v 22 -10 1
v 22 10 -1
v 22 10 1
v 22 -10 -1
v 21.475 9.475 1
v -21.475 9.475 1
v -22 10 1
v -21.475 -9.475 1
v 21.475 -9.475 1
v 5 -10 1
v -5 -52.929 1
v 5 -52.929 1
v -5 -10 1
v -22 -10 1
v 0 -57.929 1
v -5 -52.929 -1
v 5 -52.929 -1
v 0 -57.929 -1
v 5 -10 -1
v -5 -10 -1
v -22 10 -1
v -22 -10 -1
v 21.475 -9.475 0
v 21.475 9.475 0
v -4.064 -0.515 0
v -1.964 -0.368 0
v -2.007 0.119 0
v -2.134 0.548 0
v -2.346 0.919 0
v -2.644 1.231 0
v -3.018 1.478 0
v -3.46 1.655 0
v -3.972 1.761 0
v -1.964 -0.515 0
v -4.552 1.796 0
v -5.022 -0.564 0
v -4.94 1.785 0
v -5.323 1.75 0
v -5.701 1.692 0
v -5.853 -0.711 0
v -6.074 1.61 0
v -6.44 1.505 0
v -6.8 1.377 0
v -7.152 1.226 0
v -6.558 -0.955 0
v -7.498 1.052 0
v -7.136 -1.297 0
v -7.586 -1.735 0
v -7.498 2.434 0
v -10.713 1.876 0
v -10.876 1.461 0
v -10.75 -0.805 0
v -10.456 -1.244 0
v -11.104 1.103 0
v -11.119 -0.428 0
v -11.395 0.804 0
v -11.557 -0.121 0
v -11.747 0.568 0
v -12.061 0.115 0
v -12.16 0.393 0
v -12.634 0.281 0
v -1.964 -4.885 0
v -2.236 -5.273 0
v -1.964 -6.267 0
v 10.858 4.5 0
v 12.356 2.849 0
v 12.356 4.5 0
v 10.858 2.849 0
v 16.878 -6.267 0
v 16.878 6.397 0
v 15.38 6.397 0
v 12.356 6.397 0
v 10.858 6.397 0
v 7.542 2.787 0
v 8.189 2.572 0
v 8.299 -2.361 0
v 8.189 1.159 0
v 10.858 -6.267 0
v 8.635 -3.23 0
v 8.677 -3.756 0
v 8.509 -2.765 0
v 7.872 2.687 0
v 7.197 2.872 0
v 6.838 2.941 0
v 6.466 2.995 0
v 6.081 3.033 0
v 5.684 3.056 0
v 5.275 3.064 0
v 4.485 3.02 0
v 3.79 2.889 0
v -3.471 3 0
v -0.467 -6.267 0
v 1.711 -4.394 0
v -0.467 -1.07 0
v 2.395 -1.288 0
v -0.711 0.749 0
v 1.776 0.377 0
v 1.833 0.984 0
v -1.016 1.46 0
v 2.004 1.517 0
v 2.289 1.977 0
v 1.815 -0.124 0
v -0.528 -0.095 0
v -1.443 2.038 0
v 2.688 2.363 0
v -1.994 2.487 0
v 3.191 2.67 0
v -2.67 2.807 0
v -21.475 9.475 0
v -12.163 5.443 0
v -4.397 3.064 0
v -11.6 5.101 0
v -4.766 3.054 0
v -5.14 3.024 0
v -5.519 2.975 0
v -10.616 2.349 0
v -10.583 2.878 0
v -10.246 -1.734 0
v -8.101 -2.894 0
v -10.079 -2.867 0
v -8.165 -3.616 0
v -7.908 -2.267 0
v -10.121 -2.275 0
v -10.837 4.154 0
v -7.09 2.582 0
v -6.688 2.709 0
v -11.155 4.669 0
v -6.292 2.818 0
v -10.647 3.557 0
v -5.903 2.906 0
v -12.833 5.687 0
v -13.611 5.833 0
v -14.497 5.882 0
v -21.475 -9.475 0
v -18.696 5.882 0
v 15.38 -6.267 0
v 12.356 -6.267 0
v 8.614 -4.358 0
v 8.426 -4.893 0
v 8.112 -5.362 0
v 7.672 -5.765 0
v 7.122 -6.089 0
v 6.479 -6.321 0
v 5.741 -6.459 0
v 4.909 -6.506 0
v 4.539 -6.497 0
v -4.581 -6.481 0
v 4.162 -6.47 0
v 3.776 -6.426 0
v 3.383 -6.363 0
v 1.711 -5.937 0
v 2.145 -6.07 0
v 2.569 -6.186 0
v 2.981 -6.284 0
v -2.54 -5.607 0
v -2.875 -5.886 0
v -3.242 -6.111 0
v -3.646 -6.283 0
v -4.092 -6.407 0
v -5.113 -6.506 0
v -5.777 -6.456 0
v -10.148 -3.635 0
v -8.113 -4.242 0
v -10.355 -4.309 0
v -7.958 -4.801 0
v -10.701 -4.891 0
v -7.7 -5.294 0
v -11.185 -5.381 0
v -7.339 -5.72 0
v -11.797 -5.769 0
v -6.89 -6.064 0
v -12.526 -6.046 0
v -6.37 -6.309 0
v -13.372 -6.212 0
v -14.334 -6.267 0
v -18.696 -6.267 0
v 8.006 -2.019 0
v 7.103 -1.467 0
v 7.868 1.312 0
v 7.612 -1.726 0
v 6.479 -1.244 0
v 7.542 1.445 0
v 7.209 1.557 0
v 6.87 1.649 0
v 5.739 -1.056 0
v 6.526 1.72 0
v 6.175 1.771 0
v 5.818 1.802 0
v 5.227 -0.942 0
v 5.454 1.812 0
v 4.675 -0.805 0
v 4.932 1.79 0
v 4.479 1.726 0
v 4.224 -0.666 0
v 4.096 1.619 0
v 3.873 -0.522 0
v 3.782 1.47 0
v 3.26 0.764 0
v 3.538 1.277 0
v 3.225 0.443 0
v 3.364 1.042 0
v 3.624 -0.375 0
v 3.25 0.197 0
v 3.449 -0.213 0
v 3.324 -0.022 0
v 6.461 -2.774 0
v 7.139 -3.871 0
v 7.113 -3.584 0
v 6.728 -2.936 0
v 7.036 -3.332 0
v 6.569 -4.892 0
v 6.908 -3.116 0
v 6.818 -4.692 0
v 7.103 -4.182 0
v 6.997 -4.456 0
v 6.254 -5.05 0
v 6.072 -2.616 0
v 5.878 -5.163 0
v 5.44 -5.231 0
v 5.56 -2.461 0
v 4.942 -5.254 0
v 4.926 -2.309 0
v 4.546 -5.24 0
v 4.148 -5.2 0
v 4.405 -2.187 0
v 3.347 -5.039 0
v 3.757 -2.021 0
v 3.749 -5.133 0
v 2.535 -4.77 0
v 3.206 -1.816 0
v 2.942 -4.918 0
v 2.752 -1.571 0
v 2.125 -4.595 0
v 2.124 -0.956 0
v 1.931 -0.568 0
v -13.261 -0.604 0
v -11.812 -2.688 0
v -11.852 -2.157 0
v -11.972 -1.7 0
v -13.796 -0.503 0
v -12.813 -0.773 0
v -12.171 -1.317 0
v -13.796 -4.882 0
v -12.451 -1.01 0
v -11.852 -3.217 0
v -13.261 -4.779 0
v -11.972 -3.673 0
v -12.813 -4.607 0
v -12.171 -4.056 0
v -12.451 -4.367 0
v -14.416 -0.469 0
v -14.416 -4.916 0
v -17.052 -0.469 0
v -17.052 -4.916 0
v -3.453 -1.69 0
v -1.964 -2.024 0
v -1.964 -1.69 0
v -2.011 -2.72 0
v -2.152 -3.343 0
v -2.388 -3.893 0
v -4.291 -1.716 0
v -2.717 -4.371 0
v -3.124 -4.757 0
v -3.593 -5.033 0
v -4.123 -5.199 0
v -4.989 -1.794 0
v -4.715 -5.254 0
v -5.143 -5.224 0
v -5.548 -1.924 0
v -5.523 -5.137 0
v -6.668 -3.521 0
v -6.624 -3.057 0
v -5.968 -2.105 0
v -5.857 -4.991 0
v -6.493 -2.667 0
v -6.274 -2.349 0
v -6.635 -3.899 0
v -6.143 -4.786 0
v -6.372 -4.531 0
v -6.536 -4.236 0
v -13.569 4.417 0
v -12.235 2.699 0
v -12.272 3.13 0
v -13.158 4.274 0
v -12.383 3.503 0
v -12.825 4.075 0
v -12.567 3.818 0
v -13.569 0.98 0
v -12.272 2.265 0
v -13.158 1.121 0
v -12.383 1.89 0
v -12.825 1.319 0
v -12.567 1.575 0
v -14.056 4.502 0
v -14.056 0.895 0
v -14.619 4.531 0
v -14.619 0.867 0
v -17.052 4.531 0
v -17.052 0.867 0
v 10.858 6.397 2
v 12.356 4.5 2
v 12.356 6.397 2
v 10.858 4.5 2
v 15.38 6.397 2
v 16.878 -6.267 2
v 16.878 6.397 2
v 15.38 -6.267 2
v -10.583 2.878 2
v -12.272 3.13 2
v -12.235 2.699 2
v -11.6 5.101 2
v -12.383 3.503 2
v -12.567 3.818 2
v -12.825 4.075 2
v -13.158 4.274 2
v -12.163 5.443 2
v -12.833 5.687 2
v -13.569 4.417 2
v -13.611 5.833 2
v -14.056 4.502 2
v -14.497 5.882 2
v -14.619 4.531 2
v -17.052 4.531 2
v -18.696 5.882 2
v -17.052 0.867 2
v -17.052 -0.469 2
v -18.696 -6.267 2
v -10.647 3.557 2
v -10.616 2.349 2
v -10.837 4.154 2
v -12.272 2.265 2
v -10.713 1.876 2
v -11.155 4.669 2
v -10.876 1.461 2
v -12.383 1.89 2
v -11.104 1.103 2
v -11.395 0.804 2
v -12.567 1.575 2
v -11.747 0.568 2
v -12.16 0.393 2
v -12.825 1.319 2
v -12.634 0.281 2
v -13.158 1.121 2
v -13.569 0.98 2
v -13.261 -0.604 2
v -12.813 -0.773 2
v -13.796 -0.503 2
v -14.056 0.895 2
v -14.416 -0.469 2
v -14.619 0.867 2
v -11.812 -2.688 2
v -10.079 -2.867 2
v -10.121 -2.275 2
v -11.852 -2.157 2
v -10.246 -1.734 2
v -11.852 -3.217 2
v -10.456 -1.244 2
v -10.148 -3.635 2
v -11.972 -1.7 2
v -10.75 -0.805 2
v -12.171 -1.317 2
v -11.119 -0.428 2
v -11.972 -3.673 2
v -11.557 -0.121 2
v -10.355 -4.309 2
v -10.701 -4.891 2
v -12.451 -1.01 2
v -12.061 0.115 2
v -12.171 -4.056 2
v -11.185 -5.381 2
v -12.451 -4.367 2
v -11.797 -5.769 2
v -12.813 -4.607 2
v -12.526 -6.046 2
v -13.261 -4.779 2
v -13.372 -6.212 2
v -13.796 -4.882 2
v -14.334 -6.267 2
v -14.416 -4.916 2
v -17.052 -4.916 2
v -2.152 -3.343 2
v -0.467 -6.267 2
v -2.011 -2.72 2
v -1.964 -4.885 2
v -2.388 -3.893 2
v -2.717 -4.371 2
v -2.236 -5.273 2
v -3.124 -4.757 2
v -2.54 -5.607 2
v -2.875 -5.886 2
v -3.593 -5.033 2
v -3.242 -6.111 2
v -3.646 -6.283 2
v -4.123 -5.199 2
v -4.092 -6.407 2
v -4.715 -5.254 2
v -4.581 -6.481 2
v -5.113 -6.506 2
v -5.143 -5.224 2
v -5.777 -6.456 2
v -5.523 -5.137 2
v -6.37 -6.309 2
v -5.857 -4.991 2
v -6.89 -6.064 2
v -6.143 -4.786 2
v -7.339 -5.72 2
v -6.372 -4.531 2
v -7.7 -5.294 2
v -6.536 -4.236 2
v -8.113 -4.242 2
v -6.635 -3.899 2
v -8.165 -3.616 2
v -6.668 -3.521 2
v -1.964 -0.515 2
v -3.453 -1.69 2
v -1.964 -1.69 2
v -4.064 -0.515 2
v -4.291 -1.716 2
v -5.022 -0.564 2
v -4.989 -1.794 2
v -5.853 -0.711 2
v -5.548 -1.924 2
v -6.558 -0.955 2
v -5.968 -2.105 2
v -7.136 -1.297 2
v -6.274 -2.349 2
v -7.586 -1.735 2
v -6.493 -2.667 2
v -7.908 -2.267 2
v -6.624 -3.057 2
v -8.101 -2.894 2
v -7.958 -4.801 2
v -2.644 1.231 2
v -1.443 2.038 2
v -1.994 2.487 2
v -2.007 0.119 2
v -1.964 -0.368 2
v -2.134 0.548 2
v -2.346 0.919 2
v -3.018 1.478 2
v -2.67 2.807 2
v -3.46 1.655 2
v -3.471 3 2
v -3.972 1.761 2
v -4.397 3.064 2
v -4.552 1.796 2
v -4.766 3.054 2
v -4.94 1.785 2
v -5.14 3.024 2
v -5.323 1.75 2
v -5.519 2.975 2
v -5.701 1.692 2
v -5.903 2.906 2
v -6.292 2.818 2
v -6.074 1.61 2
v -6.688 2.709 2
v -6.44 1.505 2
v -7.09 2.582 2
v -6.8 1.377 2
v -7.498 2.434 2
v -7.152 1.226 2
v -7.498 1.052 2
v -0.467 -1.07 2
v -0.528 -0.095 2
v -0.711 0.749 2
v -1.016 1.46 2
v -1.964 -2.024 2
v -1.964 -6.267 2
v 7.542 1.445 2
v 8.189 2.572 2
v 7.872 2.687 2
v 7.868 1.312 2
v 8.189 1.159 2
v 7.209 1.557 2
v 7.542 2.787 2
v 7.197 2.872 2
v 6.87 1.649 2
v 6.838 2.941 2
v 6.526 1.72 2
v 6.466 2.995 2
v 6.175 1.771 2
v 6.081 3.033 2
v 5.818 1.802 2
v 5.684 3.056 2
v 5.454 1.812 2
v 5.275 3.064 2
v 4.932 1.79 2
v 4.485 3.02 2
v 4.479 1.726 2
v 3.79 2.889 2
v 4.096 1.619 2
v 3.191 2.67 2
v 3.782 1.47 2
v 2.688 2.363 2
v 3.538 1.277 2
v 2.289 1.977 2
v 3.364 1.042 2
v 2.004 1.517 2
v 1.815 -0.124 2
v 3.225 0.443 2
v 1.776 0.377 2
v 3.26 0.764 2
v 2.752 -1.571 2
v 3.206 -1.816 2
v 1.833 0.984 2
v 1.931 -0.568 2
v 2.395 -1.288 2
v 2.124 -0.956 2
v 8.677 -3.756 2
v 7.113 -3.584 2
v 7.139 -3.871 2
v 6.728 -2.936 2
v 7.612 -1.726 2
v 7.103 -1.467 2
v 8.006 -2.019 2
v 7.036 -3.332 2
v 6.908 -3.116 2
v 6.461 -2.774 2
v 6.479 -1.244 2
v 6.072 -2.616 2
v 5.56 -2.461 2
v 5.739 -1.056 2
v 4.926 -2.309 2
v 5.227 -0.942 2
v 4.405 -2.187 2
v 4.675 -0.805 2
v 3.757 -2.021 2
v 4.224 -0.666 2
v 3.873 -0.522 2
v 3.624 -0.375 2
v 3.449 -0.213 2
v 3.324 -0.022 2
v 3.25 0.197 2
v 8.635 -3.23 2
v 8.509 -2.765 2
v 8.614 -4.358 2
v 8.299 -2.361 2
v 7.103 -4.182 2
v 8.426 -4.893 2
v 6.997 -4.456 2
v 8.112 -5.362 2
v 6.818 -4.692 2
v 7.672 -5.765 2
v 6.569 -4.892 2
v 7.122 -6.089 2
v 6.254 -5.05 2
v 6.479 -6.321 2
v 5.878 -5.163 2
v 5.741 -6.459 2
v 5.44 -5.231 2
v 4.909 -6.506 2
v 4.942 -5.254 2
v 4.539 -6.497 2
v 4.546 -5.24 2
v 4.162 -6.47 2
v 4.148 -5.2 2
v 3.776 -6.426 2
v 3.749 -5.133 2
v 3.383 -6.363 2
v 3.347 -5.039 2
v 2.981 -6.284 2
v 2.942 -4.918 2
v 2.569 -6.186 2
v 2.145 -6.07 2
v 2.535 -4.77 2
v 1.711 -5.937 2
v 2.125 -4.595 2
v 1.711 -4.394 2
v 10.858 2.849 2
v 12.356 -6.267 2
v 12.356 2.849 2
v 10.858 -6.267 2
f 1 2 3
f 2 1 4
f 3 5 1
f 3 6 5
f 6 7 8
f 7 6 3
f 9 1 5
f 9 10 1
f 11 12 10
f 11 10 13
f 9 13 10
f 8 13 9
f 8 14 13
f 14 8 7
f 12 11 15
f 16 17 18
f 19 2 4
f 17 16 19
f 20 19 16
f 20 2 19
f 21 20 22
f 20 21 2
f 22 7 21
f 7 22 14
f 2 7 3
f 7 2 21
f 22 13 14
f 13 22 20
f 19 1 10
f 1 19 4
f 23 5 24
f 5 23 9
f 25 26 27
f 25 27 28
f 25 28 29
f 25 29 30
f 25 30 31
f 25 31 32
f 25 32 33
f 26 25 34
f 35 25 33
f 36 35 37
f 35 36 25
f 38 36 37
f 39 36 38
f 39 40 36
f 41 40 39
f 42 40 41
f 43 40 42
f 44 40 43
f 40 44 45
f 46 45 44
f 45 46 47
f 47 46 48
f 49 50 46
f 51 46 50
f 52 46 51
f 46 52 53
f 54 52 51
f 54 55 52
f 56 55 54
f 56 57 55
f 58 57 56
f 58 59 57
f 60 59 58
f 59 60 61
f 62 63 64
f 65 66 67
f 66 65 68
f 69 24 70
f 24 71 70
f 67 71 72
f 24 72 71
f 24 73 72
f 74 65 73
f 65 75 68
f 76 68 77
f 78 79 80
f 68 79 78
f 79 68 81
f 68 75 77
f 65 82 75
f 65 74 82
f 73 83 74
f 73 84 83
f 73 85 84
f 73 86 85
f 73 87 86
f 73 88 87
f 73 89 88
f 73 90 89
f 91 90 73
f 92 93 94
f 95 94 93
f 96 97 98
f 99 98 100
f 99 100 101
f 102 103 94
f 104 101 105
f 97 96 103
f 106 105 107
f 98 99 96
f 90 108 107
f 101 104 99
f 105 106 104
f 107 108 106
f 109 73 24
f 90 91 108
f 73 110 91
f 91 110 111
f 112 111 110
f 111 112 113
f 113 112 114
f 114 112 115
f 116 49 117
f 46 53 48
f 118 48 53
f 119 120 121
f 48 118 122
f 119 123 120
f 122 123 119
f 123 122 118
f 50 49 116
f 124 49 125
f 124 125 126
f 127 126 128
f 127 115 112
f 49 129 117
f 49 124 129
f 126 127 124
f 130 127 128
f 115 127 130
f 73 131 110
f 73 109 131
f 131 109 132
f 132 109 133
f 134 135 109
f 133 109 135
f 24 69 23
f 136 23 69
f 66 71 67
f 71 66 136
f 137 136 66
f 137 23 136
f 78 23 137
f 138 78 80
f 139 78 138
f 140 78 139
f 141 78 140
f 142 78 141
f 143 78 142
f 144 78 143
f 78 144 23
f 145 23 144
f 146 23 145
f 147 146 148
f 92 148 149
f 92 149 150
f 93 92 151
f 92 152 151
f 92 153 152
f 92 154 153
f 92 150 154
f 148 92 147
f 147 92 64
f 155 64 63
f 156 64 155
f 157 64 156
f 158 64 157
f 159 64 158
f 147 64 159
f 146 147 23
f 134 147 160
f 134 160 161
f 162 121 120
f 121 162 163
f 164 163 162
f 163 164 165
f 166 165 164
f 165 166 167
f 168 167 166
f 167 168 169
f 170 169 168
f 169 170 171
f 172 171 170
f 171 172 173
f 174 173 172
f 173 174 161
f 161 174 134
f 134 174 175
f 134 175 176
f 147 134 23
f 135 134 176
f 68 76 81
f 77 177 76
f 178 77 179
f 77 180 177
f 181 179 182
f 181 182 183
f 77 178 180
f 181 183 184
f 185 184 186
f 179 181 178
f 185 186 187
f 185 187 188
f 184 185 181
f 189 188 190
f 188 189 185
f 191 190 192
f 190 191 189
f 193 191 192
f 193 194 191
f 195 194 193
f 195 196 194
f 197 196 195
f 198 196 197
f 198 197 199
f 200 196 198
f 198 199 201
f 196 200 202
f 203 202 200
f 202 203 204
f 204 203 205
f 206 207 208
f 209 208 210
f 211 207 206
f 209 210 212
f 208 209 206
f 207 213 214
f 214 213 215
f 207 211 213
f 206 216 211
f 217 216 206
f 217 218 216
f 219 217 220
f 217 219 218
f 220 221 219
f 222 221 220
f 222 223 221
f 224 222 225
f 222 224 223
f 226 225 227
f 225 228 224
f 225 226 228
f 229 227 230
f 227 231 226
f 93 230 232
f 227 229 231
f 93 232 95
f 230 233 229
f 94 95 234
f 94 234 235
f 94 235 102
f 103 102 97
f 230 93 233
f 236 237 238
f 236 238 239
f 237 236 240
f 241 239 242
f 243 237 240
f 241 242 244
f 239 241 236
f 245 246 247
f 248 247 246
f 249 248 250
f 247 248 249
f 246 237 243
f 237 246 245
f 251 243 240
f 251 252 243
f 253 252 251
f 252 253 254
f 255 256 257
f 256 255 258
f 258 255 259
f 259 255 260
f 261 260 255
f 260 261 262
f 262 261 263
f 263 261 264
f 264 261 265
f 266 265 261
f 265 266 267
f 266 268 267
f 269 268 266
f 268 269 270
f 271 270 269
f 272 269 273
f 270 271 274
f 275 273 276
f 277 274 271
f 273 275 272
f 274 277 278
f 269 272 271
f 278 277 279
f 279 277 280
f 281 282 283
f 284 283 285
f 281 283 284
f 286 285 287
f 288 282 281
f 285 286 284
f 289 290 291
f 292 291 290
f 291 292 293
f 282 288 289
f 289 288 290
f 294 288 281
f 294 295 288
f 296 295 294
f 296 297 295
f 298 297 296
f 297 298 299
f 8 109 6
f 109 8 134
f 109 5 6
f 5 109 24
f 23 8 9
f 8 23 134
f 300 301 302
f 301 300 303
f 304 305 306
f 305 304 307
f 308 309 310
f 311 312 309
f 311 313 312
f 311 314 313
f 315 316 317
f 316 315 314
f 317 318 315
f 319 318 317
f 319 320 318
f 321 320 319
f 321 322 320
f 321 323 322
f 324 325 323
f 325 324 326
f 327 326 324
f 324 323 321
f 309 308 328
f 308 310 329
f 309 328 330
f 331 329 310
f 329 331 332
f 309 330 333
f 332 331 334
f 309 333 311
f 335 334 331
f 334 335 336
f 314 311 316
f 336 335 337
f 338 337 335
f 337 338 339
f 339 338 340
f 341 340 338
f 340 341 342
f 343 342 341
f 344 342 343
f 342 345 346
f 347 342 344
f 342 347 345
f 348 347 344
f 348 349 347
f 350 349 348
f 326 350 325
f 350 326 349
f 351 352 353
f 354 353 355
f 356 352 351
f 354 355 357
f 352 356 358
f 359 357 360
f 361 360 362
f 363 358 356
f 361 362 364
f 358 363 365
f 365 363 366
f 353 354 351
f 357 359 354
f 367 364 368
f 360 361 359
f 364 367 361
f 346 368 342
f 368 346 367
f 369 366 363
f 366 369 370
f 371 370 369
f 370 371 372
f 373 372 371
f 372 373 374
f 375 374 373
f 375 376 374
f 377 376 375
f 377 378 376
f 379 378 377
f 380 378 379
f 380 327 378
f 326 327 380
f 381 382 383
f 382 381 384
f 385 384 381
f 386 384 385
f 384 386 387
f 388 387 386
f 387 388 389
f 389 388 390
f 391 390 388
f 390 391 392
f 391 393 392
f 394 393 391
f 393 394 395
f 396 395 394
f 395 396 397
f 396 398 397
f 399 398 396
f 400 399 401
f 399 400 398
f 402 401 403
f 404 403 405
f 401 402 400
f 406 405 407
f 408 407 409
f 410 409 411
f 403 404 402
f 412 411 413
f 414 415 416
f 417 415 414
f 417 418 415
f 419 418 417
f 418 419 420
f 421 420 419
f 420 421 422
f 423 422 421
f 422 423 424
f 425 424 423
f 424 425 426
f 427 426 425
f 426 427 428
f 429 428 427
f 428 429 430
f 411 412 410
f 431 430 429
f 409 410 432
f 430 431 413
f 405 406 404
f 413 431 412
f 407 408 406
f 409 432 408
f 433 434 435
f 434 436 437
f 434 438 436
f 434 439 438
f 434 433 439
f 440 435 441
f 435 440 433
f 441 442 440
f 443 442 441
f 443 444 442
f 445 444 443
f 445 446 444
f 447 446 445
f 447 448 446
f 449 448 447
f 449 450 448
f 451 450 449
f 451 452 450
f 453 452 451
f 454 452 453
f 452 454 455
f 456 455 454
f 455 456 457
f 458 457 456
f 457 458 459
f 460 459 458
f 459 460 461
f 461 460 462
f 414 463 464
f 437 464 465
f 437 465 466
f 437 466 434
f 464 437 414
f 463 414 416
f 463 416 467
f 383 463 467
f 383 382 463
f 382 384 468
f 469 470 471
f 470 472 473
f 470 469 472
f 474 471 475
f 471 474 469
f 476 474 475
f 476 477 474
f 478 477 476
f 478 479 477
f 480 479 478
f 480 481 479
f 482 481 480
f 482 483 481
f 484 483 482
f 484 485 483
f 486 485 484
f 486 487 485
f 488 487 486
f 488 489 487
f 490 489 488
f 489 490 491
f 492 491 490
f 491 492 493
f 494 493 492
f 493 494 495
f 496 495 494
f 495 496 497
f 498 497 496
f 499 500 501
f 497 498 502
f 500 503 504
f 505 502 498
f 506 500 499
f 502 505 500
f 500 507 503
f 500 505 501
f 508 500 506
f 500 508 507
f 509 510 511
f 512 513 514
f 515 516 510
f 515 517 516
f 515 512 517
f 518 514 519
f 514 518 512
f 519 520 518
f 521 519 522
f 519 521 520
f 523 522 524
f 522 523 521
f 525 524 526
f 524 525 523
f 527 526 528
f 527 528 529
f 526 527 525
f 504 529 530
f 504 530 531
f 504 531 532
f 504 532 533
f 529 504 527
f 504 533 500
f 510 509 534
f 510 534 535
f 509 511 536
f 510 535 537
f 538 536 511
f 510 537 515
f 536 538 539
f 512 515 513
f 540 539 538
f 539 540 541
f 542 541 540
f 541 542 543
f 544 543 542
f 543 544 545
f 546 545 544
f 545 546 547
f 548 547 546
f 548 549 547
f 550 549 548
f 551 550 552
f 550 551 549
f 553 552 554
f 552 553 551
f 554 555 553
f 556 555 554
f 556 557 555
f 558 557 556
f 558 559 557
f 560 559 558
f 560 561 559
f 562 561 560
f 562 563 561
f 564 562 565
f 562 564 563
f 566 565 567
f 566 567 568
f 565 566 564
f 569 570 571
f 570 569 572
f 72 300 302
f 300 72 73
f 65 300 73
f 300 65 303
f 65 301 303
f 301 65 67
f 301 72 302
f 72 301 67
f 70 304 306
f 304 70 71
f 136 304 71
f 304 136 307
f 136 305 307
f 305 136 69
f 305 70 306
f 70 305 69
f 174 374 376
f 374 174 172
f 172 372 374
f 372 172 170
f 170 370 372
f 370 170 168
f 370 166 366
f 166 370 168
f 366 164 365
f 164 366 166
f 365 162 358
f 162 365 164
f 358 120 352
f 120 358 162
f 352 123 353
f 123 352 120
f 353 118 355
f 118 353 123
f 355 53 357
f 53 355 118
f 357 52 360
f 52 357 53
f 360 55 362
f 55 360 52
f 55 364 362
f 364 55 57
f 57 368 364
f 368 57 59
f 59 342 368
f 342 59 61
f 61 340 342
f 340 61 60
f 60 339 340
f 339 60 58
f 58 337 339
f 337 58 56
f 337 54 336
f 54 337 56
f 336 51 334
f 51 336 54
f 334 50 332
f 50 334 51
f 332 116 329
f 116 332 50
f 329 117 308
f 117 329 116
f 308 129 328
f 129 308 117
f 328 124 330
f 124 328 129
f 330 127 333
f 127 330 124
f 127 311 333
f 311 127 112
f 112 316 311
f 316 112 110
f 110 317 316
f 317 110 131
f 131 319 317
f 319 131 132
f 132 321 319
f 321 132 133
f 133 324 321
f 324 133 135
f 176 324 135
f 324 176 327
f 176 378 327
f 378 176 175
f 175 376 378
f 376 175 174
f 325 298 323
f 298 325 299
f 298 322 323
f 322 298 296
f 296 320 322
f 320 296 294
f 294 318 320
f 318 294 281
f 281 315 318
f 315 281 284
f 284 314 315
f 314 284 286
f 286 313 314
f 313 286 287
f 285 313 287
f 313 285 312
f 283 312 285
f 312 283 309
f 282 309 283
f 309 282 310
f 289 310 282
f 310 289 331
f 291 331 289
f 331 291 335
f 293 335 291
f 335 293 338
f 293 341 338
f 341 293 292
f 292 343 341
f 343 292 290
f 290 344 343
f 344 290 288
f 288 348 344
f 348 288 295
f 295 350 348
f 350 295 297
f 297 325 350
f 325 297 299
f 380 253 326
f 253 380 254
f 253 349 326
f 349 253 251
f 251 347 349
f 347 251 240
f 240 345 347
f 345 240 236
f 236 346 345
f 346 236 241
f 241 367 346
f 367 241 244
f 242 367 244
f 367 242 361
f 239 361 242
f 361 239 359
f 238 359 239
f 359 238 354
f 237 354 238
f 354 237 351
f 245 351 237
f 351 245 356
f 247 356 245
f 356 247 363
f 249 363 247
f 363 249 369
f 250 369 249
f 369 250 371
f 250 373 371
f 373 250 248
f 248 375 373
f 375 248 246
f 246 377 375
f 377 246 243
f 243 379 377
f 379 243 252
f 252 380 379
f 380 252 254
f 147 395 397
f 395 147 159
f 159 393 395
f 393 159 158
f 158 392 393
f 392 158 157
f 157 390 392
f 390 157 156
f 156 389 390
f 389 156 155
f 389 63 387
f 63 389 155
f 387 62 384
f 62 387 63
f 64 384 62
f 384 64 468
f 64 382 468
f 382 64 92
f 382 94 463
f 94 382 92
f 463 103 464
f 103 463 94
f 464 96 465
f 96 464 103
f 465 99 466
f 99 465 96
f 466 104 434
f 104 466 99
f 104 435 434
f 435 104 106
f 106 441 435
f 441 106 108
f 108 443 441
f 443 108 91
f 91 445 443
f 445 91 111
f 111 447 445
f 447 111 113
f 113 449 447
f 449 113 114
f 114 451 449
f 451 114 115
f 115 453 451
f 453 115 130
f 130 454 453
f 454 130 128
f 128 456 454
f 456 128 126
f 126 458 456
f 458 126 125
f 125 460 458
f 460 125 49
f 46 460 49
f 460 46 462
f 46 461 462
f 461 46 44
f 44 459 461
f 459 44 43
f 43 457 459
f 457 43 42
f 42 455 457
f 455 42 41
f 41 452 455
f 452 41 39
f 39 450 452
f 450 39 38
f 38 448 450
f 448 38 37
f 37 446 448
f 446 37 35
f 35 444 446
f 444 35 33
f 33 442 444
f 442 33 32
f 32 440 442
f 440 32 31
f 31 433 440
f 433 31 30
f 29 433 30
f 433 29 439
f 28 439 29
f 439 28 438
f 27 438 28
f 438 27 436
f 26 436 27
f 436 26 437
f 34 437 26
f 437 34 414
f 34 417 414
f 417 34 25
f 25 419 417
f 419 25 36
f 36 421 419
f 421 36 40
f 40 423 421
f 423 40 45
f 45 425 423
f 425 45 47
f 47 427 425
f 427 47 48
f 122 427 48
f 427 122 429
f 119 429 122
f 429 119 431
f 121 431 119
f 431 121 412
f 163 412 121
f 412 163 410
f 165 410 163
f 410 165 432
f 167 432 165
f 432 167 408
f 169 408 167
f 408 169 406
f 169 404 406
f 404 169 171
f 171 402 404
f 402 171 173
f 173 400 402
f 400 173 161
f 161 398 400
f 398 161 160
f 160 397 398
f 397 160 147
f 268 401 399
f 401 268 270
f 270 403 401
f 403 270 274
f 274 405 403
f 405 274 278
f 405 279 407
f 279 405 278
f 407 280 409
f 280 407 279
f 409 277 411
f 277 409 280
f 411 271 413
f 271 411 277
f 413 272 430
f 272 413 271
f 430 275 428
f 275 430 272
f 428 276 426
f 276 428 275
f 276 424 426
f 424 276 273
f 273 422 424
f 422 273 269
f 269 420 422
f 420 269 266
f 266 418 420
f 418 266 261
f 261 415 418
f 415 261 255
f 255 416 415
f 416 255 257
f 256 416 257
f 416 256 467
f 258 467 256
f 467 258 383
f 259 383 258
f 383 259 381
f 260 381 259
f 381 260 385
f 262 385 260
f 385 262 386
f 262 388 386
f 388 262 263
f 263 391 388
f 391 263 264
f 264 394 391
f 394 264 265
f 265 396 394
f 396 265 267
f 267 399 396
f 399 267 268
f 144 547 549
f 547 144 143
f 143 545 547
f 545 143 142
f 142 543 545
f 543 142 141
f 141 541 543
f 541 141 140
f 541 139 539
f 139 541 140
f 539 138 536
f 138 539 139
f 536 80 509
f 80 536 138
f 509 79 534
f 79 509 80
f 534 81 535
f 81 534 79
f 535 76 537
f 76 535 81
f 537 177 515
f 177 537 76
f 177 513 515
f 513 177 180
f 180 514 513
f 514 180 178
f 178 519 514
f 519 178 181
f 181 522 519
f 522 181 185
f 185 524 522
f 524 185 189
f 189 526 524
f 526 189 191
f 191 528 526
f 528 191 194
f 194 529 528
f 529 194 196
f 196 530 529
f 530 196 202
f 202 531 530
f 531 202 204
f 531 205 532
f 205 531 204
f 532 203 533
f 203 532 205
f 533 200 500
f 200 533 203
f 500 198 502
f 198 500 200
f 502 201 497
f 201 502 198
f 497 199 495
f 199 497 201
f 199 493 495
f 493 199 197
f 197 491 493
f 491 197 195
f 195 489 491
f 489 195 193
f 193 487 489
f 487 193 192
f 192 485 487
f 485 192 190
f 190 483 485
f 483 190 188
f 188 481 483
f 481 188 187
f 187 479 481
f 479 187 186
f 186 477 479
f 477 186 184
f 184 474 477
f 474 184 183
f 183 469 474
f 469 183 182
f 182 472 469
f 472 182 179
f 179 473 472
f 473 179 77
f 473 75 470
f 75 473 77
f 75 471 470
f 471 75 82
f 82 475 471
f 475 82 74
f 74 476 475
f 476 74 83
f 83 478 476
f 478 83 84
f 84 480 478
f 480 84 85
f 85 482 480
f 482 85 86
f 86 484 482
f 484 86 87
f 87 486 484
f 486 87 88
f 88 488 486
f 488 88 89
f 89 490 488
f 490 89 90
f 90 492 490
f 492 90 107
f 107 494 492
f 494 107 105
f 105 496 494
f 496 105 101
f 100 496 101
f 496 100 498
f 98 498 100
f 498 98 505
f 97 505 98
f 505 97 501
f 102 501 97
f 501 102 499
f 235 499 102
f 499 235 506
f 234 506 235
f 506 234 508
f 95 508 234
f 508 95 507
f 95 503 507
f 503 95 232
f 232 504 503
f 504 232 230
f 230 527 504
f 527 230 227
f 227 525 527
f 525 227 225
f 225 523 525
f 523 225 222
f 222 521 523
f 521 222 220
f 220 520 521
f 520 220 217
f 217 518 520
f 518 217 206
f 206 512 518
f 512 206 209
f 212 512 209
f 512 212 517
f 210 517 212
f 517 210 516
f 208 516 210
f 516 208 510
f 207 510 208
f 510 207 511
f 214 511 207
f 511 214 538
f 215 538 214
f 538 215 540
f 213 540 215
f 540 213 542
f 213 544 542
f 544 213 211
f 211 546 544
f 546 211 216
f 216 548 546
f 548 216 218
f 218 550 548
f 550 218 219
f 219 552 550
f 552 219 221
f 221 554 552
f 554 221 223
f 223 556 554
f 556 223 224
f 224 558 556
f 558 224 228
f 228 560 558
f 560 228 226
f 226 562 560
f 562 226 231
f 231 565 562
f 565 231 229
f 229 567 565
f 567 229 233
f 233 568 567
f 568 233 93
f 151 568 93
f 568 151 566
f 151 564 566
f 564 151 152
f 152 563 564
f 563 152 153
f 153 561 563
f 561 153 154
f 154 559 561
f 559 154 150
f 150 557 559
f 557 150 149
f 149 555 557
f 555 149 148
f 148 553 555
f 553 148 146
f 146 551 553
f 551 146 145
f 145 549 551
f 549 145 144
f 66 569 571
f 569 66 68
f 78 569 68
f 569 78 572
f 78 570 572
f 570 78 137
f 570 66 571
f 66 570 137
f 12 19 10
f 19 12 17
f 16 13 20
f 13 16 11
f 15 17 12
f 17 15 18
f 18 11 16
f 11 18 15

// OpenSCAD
lettering = "Basil";
// font
style = "Pacifico"; //[Abril Fatface,Aclonica,Acme,Advent Pro,Akronim,Aladin,Alegreya,Alegreya Sans,Alegreya SC,Alex Brush,Alfa Slab One,Alice,Amaranth,Architects Daughter,Archivo Black,Archivo Narrow,Arimo,Arvo,Asap,Astloch,Asul,Averia Libre,Averia Serif Libre,Bangers,Basic,Belgrano,Berkshire Swash,Bigshot One,Bilbo Swash Caps,Black Ops One,Bonbon,Bowlby One SC,Brawler,Bubblegum Sans,Butterfly Kids,Cabin Condensed,Caesar Dressing,Cagliostro,Calligraffitti,Capriola,Carter One,Changa One,Chango,Chelsea Market,Cherry Cream Soda,Chewy,Chicle,Chivo,Clicker Script,Coming Soon,Concert One,Condiment,Cookie,Courgette,Covered By Your Grace,Crimson Text,Dancing Script,DejaVu Sans,DejaVu Serif,Dhurjati,Doppio One,Dosis,Droid Sans,Eagle Lake,Electrolize,Emilys Candy,Encode Sans,Encode Sans Compressed,Euphoria Script,Exo,Exo 2,Faster One,Federo,Finger Paint,Fjord One,Fontdiner Swanky,Freckle Face,Fruktur,Gabriela,Geo,Germania One,Give You Glory,Gloria Hallelujah,Goudy Bookletter 1911,Graduate,Grand Hotel,Great Vibes,Griffy,Hanalei Fill,Happy Monkey,Henny Penny,Hind,IM Fell English SC,Indie Flower,Irish Grover,Italianno,Jacques Francois Shadow,Jolly Lodger,Josefin Slab,Joti One,Judson,Just Another Hand,Kalam,Kameron,Karma,Kavoon,Knewave,Kranky,Kristi,Laila,Lakki Reddy,Lancelot,Lato,Leckerli One,Ledger,Lekton,Lemon One,Liberation Sans,Libre Caslon Text,Life Savers,Lilita One,Lily Script One,Limelight,Lobster,Lobster Two,Londrina Outline,Londrina Shadow,Londrina Solid,Lora,Love Ya Like A Sister,Loved by the King,Lovers Quarrel,Luckiest Guy,Lusitana,Macondo,Macondo Swash Caps,Mako,Marck Script,Margarine,Marko One,Maven Pro,McLaren,MedievalSharp,Merienda One,Merriweather,Mervale Script,Metal Mania,Metrophobic,Milonga,Miltonian Tattoo,Miss Fajardose,Molle,Montez,Montserrat,Mr De Haviland,Mystery Quest,Neucha,New Rocker,Niconne,Nosifer,Nothing You Could Do,Noto Sans Oriya,Noto Serif,Nova Square,Nunito,Old Standard TT,Oleo Script,Oleo Script Swash Caps,Orbitron,Oregano,Orienta,Original Surfer,Oswald,Over the Rainbow,Overlock,Oxygen,Pacifico,Paprika,Parisienne,Patrick Hand SC,Paytone One,Peralta,Permanent Marker,Piedra,Pirata One,Play,Playball,Poetsen One,Poppins,Press Start 2P,Princess Sofia,PT Mono,Qwigley,Racing Sans One,Raleway,Rancho,Ranga,Ribeye,Roboto,Roboto Condensed,Roboto Slab,Rochester,Rock Salt,Rubik One,Sail,Salsa,Sansita One,Sarina,Satisfy,Schoolbell,Seaweed Script,Sevillana,Shadows Into Light,Shadows Into Light Two,Share,Six Caps,Skranji,Source Sans Pro,Spicy Rice,Stardos Stencil,Stoke,Syncopate,Teko,Terminal Dosis,The Girl Next Door,Tillana,Timmana,Titillium Web,Ubuntu,Ultra,Underdog,UnifrakturCook,UnifrakturMaguntia,Vampiro One,Vidaloka,Viga,Voces,Volkhov,Vollkorn,Voltaire,Waiting for the Sunrise,Wallpoet,Wellfleet,Wendy One,Yellowtail,Yesteryear,Zeyada]
labelStyle = "Indent"; //[Cutout,OnTop,Indent]
oneOrTwoSticks = "One"; //[One, Two]

textSpacing = 1; //[1:10]
textSize = 12; //[1:30]
textNudgeX = -10; //[-100:100]
textNudgeY = -2; //[-100:100]
textHeight = 2; //[1:10]



labelWidth = 44; //[1:200]
labelHeight = 20; //[1:50]
labelDepth = 2; //[1:10]
//only used for indent style; no sense to make this more than Label Depth; value =
indentDepth = 1;
// good idea to make this a multiple of nozzle size
indentEdgeWidth = 1.05;
stickWidth = 10; //[1:50]
stickLength = 50; //[1:200]


module label1() {
    difference() {
        cube ([labelWidth, labelHeight, labelDepth], center=true);
        translate([textNudgeX/10,textNudgeY/10,-(labelDepth+1)/2])
        linear_extrude(height=textHeight)
        text (lettering,  size=textSize, font = style, halign = "center", valign = "center", spacing = textSpacing);
    };
}

module label2() {
        cube ([labelWidth, labelHeight, labelDepth], center=true);
        translate([textNudgeX/10,textNudgeY/10,(labelDepth)/2])
        linear_extrude(height=textHeight)
        text (lettering,  size=textSize, font = style, halign = "center", valign = "center", spacing = textSpacing);
}

module label3() {
    difference() {
        cube ([labelWidth, labelHeight, labelDepth], center=true);
        translate([0,0,2*labelDepth/2+labelDepth/2-indentDepth])
        cube ([labelWidth-indentEdgeWidth, labelHeight-indentEdgeWidth, 2*labelDepth], center=true);
    }
        translate([textNudgeX/10,textNudgeY/10,(labelDepth)/2-indentDepth])
        linear_extrude(height=textHeight)
        text (lettering,  size=textSize, font = style, halign = "center", valign = "center", spacing = textSpacing);
}

module stick() {
    translate([0,-stickLength/2-labelHeight/2,0])
    difference() {
        cube([stickWidth,stickLength,labelDepth],center=true);
        translate([stickWidth/2,-stickLength/2,0])
        rotate([0,0,45])
        cube([stickWidth,stickWidth,labelDepth+1],center=true);
        translate([-stickWidth/2,-stickLength/2,0])
        rotate([0,0,45])
        cube([stickWidth,stickWidth,labelDepth+1],center=true);
    }
}

if (labelStyle == "Cutout") {
    label1();
} else if (labelStyle == "OnTop") {
    label2();
} else {
    label3();
}
    
if (oneOrTwoSticks == "One") {
    stick();
} else {
    translate([labelWidth/2-stickWidth/2,0,0])
    stick();
    translate([-(labelWidth/2-stickWidth/2),0,0])
    stick();
}
